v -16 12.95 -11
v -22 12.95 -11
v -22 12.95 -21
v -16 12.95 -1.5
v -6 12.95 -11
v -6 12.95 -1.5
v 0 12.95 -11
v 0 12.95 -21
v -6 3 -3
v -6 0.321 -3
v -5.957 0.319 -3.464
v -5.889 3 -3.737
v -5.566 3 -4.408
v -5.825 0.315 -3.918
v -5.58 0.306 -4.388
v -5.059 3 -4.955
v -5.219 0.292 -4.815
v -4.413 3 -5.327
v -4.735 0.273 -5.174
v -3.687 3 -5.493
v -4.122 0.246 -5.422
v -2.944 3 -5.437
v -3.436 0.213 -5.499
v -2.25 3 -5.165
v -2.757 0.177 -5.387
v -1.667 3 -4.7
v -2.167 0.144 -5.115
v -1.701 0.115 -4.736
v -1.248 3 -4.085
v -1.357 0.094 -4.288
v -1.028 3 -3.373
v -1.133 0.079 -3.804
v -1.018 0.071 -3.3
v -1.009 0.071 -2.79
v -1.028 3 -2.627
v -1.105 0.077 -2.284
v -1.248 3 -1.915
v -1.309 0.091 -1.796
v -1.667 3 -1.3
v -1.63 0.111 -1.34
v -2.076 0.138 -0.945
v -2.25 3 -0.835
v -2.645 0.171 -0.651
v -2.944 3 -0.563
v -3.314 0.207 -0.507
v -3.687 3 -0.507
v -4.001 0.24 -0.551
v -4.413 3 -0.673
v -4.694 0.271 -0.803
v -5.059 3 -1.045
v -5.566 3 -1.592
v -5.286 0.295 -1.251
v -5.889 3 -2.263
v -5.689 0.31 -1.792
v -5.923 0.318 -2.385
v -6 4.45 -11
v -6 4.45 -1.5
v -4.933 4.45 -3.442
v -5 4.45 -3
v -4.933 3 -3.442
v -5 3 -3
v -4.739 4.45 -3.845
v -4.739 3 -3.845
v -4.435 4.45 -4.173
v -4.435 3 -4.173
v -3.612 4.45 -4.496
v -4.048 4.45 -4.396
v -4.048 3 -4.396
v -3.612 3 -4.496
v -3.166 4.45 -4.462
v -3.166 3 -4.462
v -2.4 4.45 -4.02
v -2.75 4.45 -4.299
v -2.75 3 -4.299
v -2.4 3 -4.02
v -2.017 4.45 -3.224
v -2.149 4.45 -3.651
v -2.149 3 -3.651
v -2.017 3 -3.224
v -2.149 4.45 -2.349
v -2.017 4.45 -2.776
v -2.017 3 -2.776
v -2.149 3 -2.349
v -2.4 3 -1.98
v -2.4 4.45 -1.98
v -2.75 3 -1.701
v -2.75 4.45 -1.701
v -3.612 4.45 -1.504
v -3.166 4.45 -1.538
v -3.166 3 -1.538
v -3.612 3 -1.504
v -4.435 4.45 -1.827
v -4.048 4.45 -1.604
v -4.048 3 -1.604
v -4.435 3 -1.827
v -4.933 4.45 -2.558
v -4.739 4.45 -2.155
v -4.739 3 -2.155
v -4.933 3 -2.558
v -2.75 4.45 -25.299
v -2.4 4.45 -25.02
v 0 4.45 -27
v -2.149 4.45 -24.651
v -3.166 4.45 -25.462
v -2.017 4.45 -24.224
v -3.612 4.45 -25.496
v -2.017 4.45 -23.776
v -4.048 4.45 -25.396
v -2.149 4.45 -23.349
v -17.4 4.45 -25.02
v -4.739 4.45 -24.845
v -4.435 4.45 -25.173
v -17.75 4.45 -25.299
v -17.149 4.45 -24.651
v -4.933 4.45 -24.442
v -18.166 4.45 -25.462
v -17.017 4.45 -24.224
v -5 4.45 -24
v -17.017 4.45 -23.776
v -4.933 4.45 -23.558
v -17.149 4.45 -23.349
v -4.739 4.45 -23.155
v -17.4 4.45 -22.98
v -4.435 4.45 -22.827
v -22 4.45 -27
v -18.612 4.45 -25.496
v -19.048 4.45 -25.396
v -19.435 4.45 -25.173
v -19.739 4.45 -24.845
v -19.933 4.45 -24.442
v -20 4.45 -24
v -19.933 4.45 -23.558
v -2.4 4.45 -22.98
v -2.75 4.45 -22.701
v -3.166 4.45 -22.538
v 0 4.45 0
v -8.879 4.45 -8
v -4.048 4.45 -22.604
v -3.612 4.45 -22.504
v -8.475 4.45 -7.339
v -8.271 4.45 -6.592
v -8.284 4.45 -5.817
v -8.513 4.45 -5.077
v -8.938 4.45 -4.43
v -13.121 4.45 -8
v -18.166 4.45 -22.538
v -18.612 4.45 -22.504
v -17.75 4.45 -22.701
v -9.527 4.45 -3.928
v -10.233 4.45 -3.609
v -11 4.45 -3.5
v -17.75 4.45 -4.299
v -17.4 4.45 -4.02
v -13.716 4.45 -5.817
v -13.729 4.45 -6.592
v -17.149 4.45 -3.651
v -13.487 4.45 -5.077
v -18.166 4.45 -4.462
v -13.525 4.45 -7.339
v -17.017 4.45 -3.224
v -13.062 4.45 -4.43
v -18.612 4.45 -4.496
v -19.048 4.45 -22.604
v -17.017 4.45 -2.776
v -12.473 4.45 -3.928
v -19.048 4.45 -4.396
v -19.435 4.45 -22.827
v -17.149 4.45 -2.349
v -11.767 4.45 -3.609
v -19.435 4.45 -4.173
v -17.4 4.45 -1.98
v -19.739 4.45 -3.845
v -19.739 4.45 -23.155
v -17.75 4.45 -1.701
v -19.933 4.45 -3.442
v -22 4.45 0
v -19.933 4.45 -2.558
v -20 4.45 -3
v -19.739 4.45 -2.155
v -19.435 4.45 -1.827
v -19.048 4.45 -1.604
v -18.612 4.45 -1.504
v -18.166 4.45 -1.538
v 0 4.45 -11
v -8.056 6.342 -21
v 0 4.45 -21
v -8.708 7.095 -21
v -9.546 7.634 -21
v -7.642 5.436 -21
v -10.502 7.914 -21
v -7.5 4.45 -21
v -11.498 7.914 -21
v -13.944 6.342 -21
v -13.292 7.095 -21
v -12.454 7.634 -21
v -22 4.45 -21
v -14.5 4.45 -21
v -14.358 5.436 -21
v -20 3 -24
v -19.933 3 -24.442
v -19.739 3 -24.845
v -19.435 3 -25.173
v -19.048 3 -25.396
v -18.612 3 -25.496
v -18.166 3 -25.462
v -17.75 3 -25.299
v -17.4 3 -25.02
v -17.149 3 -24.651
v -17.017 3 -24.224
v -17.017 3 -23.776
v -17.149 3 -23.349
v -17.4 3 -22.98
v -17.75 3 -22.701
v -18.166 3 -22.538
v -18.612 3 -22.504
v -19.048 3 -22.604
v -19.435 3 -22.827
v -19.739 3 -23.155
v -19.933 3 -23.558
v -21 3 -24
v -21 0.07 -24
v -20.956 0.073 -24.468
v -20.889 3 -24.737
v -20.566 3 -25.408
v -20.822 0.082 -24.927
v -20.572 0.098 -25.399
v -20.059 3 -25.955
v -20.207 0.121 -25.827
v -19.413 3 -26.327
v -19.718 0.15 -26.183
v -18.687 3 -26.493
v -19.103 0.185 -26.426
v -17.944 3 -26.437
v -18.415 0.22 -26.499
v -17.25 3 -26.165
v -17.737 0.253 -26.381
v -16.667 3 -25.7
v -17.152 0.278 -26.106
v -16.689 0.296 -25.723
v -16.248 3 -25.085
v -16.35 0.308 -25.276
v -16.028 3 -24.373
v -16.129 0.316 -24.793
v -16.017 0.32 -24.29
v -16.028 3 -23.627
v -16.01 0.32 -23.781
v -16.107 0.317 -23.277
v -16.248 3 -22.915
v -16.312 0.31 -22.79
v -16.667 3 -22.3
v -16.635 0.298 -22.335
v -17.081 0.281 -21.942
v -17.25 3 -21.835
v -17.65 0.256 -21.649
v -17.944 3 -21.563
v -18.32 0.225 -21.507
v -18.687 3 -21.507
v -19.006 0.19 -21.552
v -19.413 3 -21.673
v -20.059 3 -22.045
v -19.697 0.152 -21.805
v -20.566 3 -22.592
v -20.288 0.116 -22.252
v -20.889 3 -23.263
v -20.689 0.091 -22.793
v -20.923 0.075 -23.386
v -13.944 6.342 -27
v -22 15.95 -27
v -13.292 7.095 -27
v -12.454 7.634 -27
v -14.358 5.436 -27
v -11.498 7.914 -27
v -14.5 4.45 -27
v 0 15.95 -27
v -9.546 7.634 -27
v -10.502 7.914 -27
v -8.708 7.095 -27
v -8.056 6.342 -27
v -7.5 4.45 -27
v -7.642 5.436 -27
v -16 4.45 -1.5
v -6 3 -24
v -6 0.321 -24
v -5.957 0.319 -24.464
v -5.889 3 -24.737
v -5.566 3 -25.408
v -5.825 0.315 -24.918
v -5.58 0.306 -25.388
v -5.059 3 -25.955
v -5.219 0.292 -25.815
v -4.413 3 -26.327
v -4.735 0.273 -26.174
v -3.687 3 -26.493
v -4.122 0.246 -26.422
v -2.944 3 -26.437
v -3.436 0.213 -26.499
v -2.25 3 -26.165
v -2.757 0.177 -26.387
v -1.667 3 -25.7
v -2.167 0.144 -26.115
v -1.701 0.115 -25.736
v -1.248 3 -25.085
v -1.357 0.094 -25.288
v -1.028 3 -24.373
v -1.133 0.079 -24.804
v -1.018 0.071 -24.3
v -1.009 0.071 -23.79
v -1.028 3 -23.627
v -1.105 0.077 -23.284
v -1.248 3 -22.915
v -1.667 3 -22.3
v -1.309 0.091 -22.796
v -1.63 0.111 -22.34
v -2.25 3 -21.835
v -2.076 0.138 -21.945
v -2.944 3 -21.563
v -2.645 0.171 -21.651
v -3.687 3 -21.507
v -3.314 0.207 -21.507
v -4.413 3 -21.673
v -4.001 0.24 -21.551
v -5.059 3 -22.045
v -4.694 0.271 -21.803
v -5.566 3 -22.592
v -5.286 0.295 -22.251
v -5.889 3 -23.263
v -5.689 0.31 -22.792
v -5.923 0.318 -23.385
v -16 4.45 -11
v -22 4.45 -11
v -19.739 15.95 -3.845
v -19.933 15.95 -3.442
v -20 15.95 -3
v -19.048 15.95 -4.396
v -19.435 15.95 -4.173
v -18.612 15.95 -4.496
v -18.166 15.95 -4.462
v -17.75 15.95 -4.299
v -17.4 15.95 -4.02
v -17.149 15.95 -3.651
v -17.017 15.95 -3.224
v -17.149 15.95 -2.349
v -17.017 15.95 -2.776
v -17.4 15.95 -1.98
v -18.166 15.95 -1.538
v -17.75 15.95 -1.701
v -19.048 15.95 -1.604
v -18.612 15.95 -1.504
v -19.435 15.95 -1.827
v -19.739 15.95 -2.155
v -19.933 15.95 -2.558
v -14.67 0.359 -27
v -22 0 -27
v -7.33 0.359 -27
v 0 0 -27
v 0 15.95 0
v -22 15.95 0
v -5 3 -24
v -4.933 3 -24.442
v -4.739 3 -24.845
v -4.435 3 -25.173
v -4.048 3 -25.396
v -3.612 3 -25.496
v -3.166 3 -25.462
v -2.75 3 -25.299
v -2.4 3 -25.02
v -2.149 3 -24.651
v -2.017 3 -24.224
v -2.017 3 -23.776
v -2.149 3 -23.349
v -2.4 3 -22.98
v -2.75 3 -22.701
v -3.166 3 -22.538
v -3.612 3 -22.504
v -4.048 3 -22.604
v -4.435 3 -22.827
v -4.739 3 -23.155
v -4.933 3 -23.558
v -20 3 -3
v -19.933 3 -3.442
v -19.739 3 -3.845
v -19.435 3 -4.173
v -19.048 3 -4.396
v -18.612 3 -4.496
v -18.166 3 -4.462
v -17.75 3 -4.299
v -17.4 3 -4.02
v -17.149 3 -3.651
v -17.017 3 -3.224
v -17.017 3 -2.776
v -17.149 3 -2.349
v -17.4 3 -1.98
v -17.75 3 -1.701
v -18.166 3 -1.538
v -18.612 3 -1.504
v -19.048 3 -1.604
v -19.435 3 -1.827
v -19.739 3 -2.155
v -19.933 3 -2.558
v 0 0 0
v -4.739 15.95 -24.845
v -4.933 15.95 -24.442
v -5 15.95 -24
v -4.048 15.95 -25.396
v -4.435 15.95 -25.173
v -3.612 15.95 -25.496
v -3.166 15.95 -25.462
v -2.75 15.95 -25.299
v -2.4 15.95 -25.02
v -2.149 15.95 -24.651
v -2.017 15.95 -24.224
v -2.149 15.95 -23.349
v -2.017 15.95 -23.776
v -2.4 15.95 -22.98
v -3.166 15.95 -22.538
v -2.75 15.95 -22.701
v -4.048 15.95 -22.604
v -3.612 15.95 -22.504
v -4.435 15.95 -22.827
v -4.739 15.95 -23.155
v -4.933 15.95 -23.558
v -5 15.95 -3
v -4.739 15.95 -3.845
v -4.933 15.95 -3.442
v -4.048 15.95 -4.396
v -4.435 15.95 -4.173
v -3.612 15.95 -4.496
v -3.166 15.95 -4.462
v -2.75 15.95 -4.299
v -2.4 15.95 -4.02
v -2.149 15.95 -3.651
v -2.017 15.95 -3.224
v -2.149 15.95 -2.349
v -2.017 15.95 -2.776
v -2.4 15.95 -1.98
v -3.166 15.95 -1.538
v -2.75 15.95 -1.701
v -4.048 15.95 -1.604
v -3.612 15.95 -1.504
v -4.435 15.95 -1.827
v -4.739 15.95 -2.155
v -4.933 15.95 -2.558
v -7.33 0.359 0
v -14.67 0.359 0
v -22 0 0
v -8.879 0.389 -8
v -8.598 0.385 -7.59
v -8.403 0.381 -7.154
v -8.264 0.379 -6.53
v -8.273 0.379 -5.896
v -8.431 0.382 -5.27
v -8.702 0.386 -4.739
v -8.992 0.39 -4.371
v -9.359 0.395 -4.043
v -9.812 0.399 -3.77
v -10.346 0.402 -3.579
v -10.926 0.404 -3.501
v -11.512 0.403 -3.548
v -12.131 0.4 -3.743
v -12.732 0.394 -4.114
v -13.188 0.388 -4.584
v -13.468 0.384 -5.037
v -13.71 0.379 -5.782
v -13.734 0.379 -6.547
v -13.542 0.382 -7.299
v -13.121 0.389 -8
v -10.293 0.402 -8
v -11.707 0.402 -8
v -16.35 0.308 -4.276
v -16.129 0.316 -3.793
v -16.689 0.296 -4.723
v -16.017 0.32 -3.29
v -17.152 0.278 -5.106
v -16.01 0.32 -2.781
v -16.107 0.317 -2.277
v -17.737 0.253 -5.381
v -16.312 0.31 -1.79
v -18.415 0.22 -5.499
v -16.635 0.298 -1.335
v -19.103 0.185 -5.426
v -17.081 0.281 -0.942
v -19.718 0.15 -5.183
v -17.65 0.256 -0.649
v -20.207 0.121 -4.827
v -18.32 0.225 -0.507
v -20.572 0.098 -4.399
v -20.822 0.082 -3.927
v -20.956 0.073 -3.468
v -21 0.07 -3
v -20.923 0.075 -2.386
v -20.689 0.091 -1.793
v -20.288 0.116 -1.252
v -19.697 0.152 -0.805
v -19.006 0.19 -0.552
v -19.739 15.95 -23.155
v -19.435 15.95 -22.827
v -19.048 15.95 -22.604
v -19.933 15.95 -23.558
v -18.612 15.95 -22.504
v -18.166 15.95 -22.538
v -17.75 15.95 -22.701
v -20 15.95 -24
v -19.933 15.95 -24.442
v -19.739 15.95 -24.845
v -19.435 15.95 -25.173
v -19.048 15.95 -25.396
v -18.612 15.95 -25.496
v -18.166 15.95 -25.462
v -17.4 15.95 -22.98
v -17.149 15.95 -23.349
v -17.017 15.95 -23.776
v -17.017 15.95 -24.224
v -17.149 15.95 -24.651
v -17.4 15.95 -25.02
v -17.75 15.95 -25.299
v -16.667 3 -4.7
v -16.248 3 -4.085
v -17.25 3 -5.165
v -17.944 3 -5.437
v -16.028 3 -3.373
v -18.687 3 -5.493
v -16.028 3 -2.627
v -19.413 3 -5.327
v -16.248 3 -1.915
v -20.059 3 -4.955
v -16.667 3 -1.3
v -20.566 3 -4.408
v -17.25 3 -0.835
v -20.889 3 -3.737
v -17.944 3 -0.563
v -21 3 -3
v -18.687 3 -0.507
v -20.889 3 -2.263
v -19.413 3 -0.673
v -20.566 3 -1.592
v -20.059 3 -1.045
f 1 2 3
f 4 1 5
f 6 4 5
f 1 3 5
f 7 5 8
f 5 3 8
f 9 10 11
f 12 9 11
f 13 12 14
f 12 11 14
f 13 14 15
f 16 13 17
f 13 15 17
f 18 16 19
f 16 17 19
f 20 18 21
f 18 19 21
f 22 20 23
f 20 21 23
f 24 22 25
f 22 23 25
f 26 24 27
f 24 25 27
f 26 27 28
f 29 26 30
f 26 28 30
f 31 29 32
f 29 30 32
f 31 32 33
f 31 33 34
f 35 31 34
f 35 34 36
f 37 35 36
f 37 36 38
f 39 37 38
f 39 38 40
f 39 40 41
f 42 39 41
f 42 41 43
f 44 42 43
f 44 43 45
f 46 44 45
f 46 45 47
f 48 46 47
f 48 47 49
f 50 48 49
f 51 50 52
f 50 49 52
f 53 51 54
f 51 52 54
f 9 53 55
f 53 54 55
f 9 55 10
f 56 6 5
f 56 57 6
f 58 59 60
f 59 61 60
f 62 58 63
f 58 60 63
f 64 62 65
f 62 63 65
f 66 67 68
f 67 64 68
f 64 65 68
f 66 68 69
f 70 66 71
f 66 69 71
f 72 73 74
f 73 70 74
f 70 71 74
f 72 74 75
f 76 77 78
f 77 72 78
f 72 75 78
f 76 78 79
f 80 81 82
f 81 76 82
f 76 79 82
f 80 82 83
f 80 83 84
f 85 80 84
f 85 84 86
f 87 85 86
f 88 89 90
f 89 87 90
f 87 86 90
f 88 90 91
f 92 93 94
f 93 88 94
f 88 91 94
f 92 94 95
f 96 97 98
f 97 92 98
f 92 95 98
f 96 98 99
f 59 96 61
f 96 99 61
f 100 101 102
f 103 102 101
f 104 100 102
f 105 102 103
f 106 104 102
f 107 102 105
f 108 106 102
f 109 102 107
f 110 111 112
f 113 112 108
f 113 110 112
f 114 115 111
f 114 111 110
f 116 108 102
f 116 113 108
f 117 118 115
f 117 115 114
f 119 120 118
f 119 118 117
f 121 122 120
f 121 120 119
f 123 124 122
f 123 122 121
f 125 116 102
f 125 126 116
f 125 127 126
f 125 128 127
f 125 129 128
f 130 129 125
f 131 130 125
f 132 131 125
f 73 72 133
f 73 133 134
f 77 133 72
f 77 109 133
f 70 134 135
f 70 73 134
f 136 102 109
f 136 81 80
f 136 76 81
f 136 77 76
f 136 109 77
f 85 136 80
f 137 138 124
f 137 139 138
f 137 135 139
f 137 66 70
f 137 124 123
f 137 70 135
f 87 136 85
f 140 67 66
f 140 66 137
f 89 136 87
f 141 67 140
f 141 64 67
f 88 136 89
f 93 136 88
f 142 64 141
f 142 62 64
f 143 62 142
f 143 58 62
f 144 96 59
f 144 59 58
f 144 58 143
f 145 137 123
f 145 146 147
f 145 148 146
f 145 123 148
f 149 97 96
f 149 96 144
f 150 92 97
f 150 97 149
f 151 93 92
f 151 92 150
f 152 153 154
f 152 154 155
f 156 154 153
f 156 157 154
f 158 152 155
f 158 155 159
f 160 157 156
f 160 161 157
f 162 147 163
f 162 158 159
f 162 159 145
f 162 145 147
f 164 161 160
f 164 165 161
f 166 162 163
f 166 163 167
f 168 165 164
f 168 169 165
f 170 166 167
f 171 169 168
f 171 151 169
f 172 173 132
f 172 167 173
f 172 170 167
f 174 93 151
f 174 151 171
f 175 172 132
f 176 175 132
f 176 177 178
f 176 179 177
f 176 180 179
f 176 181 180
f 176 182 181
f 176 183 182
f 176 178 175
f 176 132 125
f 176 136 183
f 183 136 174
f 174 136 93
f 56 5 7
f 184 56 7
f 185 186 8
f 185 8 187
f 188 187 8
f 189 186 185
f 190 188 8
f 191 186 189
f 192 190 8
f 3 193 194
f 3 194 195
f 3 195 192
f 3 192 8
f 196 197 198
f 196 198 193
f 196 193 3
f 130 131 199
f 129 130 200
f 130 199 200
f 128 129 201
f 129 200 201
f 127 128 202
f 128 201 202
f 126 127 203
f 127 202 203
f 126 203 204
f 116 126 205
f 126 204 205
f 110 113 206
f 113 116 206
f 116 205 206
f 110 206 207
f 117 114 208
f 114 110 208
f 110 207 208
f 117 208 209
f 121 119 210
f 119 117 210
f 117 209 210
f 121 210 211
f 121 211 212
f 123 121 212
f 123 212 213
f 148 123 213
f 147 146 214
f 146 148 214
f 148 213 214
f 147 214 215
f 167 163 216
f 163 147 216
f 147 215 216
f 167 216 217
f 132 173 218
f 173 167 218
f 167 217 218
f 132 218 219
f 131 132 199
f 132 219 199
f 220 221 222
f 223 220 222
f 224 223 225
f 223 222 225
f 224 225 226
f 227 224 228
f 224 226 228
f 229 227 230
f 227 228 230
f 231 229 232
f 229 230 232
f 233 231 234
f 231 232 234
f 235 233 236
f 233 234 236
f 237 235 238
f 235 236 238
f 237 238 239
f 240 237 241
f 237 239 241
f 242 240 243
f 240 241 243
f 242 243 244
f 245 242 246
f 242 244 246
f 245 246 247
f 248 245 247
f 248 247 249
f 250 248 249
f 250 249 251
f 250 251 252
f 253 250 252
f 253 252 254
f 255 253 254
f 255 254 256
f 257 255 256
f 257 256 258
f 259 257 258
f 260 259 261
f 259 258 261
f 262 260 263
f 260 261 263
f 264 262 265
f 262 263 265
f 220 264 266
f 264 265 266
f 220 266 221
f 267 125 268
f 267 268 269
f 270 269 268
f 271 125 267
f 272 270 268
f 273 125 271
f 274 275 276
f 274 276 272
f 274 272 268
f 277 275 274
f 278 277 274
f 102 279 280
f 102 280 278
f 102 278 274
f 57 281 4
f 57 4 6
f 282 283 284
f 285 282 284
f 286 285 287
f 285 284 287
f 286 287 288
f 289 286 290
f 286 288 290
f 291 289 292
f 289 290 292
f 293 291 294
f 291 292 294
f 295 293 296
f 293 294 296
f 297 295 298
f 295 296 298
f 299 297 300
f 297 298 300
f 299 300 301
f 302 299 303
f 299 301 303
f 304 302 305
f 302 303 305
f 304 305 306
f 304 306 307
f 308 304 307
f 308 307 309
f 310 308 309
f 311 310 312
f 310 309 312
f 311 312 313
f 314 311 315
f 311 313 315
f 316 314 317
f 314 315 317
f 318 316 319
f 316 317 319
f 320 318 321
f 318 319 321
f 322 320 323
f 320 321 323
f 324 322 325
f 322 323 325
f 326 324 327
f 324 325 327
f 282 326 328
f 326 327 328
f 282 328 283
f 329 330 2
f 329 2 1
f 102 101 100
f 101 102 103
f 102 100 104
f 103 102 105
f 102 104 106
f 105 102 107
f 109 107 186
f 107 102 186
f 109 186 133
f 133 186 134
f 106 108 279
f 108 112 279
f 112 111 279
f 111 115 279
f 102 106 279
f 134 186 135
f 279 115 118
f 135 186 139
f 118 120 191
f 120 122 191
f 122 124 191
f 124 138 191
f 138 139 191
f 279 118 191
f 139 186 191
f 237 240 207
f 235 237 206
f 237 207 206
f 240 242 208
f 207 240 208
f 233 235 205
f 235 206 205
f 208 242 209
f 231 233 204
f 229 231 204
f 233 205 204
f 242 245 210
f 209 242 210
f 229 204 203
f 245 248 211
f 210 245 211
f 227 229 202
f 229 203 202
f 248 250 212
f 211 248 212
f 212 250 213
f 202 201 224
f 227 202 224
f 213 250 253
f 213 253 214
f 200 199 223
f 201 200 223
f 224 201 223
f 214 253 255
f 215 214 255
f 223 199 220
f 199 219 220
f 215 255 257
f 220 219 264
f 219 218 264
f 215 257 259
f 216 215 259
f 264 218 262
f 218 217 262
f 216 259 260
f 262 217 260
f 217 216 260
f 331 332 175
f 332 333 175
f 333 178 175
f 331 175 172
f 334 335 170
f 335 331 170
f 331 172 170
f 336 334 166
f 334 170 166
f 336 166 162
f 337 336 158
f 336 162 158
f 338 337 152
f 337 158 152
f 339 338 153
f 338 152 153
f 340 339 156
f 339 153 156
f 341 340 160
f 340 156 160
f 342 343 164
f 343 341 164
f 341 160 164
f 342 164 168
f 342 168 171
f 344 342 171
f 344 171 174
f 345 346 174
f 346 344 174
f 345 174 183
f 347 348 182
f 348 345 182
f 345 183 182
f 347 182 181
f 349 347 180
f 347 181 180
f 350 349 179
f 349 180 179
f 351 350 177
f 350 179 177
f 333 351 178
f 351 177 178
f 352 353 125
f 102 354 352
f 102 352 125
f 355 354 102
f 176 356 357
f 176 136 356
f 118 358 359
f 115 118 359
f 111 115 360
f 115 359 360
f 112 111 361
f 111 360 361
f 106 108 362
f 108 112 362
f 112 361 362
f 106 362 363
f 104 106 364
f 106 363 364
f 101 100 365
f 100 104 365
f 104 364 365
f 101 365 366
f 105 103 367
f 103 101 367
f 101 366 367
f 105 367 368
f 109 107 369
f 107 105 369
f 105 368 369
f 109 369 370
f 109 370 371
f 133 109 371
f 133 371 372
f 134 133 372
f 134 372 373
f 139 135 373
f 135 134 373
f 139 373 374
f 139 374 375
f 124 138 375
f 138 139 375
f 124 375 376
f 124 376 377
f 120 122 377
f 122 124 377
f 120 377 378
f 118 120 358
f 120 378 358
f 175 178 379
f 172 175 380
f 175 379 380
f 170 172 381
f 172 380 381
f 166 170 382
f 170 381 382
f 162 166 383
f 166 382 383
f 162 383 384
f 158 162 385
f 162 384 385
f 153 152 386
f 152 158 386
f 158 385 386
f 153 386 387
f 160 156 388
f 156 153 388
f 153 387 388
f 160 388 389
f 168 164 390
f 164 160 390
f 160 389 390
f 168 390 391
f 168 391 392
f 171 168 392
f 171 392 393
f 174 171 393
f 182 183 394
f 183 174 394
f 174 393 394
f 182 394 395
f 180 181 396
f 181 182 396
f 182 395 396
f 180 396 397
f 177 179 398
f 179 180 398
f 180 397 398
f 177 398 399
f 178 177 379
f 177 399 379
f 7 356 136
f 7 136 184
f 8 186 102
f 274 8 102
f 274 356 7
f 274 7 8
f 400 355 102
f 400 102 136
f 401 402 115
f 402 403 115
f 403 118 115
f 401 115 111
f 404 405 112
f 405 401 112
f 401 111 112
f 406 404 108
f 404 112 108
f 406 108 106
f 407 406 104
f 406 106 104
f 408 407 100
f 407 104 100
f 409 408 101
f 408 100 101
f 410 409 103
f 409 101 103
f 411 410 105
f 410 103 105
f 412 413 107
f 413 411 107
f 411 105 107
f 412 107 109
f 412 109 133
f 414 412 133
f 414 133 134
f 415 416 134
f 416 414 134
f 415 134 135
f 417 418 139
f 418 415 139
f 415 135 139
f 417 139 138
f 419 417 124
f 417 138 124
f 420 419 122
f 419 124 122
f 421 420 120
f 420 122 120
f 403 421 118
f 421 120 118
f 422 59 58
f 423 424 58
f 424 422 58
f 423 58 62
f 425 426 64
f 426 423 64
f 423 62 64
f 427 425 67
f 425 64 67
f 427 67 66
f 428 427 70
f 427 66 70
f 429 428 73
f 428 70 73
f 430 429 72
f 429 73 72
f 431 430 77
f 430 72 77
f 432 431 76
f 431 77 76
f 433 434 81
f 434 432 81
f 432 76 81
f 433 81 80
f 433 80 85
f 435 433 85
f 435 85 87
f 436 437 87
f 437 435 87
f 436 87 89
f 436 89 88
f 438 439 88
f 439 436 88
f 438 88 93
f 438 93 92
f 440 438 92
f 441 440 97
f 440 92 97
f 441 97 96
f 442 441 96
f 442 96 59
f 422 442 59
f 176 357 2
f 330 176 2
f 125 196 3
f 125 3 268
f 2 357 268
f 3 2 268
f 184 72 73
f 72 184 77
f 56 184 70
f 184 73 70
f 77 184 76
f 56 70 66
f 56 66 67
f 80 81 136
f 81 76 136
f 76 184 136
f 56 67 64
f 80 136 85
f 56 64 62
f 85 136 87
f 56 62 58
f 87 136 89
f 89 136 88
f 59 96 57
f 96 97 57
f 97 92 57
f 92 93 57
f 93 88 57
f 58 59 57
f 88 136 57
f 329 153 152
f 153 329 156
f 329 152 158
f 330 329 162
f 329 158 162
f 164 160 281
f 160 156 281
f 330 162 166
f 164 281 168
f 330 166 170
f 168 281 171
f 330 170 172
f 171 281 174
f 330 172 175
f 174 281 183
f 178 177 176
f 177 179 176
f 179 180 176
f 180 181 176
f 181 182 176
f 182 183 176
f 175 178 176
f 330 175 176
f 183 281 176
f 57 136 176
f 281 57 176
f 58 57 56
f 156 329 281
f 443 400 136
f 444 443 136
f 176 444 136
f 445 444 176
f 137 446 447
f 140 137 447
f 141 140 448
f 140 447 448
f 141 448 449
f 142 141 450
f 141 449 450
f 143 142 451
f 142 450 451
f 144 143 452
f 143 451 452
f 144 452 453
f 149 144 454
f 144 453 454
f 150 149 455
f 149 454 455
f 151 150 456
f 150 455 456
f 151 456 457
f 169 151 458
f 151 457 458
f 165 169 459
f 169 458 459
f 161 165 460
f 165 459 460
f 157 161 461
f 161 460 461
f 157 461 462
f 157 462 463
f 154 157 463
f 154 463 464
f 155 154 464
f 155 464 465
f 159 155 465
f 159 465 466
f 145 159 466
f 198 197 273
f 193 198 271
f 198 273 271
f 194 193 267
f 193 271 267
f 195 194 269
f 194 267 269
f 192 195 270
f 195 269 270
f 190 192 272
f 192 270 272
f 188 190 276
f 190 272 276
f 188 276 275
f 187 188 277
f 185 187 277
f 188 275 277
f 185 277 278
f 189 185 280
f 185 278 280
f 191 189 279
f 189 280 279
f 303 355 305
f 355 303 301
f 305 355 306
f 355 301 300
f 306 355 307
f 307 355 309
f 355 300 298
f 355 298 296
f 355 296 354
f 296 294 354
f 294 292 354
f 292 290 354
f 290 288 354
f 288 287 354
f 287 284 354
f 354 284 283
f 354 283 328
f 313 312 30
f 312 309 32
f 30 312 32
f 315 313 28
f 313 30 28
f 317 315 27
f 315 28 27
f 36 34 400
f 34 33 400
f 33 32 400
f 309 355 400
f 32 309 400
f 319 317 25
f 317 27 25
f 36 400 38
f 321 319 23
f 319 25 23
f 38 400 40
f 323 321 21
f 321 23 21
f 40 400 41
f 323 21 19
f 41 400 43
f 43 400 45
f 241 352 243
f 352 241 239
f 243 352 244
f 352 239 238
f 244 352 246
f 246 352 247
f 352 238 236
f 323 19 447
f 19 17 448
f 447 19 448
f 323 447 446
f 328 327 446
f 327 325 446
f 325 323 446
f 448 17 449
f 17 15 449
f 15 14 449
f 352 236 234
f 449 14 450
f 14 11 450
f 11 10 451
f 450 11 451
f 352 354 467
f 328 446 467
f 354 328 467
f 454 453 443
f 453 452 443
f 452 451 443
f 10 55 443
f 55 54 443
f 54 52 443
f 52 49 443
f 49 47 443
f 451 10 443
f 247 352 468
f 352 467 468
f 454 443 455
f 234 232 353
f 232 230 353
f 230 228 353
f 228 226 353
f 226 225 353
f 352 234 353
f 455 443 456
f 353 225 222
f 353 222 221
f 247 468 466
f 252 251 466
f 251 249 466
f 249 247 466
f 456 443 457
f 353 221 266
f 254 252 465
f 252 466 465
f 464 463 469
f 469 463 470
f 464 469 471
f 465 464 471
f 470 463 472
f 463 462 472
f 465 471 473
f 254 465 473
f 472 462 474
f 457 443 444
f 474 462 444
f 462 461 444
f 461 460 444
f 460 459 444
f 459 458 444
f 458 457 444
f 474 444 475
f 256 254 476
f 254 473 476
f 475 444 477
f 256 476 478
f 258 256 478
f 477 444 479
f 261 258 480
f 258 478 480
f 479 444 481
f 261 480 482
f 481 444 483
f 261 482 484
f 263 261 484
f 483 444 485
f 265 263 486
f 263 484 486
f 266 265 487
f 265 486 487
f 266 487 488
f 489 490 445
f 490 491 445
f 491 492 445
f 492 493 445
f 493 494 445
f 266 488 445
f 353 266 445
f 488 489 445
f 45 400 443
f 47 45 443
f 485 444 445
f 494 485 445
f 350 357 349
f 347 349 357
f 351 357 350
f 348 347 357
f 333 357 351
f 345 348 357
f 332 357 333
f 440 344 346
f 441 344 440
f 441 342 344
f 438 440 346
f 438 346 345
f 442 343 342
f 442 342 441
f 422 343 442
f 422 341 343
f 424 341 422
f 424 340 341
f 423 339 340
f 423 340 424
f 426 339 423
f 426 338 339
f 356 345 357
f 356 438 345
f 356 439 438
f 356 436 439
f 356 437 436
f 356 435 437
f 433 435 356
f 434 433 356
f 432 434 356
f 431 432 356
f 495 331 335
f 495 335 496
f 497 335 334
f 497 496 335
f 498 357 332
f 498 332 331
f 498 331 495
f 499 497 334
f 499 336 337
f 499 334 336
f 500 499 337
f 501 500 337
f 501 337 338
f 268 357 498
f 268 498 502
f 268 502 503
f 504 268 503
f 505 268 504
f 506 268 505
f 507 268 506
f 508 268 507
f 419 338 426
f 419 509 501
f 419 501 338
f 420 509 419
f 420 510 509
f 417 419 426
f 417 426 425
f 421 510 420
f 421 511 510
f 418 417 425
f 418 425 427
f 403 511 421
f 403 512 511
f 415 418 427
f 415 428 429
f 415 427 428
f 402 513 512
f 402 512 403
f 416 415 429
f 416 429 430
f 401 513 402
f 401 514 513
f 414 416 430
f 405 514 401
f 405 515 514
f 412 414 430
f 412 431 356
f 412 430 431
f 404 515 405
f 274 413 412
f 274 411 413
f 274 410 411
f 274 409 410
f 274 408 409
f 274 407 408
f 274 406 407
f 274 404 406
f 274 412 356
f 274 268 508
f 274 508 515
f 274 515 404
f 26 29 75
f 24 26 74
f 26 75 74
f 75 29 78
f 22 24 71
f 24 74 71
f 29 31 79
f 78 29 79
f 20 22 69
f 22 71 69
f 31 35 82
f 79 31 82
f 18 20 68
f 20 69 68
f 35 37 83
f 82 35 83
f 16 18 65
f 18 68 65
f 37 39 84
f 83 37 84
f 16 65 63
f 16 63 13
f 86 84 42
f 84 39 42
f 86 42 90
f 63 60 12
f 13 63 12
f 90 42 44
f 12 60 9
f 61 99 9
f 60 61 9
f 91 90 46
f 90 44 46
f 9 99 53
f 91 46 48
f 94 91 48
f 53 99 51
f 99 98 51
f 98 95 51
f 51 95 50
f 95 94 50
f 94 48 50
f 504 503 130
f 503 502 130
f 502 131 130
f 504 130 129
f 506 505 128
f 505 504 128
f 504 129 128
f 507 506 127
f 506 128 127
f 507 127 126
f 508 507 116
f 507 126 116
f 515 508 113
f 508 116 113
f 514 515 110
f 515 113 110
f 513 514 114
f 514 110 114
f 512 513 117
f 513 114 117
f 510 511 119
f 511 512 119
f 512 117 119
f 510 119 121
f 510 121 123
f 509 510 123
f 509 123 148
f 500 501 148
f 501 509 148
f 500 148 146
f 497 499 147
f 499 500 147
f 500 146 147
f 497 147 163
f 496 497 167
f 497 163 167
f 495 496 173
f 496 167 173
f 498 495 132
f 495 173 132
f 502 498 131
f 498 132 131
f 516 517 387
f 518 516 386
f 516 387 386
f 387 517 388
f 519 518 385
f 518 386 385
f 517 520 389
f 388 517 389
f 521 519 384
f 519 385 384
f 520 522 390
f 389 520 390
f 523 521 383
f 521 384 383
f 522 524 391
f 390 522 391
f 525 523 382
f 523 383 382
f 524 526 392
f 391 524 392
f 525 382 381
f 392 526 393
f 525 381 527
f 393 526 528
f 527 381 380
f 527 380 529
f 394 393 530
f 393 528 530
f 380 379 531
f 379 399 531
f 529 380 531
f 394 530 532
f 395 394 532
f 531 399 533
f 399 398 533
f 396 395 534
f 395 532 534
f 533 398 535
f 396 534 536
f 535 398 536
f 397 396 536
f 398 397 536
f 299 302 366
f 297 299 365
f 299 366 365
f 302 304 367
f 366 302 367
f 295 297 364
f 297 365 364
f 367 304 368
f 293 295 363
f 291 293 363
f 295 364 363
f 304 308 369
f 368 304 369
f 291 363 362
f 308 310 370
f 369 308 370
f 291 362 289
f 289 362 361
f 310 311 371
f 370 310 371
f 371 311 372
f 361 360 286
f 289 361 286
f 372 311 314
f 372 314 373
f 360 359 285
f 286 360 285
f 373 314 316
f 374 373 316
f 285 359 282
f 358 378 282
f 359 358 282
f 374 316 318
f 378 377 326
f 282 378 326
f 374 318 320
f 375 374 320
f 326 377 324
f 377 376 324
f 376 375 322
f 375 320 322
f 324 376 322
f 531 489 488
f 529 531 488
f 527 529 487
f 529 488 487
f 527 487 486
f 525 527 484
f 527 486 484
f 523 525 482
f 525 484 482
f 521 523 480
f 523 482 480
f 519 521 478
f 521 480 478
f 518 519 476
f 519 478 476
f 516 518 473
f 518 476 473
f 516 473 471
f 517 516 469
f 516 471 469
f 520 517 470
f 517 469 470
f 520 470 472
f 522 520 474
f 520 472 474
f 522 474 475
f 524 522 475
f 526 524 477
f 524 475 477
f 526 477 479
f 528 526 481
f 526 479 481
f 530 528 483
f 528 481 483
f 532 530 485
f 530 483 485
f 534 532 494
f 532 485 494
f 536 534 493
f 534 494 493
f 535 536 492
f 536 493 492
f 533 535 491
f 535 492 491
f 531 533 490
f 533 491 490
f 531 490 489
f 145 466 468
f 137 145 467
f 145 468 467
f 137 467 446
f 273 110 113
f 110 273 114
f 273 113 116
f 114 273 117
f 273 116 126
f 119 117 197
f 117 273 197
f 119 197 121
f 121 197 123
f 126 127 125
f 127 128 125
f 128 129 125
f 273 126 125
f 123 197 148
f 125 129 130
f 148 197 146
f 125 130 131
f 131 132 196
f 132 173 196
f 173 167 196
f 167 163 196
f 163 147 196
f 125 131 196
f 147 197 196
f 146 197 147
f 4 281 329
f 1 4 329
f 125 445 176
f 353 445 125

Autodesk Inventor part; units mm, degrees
ref_plane "YZ Plane" through (0, 0, 0) normal (1, 0, 0) x (0, 1, 0)
ref_plane "XZ Plane" through (0, 0, 0) normal (0, 1, 0) x (-1, 0, 0)
ref_plane "XY Plane" through (0, 0, 0) normal (0, 0, 1) x (1, 0, 0)
sketch "Sketch1" plane through (0, 0, 0) normal (0, 1, 0) x (-1, 0, 0)
  line L0 (0, 0) -> (22, 0)
  line L1 (22, 0) -> (22, -27)
  line L2 (22, -27) -> (0, -27)
  line L3 (0, -27) -> (0, 0)
  arc A0 (13.1213, -8) -> (8.8787, -8) centre (11, -6.25) ccw
  line L4 (13.1213, -8) -> (8.8787, -8)
  line L5 (11, 0) -> (11, -27) construction
  line L6 (0, -21) -> (22, -21)
  line L7 (22, -11) -> (0, -11)
  circle A1 centre (3.5, -24) radius 1.5
  circle A2 centre (18.5, -24) radius 1.5
  circle A3 centre (3.5, -3) radius 1.5
  circle A4 centre (18.5, -3) radius 1.5
  line L8 (3.5, -3) -> (3.5, -24) construction
  line L9 (3.5, -24) -> (18.5, -24) construction
  line L10 (18.5, -24) -> (18.5, -3) construction
  line L11 (18.5, -3) -> (3.5, -3) construction
  line L12 (0, 0) -> (22, -27) construction
  line L13 (18.5, -3) -> (3.5, -24) construction
  line L14 (15.2792, -21) -> (15.2792, -27) construction
  line L15 (16, -1.5) -> (16, -11)
  line L16 (6, -1.5) -> (6, -11)
  line L17 (16, -1.5) -> (6, -11) construction
  line L18 (16, -1.5) -> (6, -1.5)
  point P0 (11, -13.5)
  point P1 (15.2792, -24)
  point P2 (11, -6.25)
  dimension "d1" = 5.5
  dimension "d2" = 4.5
  dimension "d5" = 6.25
  dimension "d6" = 22
  dimension "d8" = 10
  dimension "d9" = 3
  dimension "d10" = 6
  dimension "d11" = 3
  dimension "d12" = 3.5
  dimension "d16" = 10
  dimension "d17" = 1.5
extrude "Extrusion1" add sketch "Sketch1" along normal blind 4.45
sketch "Sketch2" plane through (0, 0, 0) normal (0, 0, 1) x (1, 0, 0)
  arc A0 (0, 0) -> (-22, 0) centre (-11, -149.5961) ccw
  line L0 (0, 0) -> (-22, 0)
  dimension "d20" = 150
extrude "Extrusion4" cut sketch "Sketch2" against normal through all
ref_plane "Work Plane1" through (0, 15.95, 0) normal (0, 1, 0) x (1, 0, 0)
extrude "Extrusion5" add sketch "Sketch1" along normal up to surface (11.5 mm away) from surface at 4.45 separate body contours L0 L1 L7 L15 L18 L16 L3 | L6 L1 L2 L3
sketch "Sketch3" plane through (0, 15.95, 0) normal (0, 1, 0) x (1, 0, 0)
  line L0 (0, 21) -> (-22, 21) projected
  line L1 (-22, 21) -> (-22, 27) projected
  line L2 (-22, 27) -> (0, 27) projected
  line L3 (0, 27) -> (0, 21) projected
  circle A0 centre (-18.5, 24) radius 1.5 projected
  circle A1 centre (-3.5, 24) radius 1.5 projected
  line L4 (-16, 11) -> (-16, 1.5) projected
  line L5 (-16, 1.5) -> (-6, 1.5) projected
  line L6 (-6, 1.5) -> (-6, 11) projected
  line L7 (-6, 11) -> (0, 11) projected
  line L8 (0, 11) -> (0, 0) projected
  line L9 (0, 0) -> (-22, 0) projected
  line L10 (-22, 0) -> (-22, 11) projected
  line L11 (-22, 11) -> (-16, 11) projected
  circle A2 centre (-3.5, 3) radius 1.5 projected
  circle A3 centre (-18.5, 3) radius 1.5 projected
  line L12 (-6, 11) -> (0, 11) projected
  line L13 (0, 11) -> (0, 21)
  line L14 (0, 0) -> (0, 27) projected
  line L15 (-22, 11) -> (-22, 21)
extrude "Extrusion6" add sketch "Sketch3" against normal blind 3 contours L13 L7 L6 L5 L4 L11 L15 L0 bodies 2
sketch "Sketch4" plane through (0, 15.95, -27) normal (0, 0, -1) x (-1, 0, 0)
  line L0 (0, -11.5) -> (22, -11.5) projected
  circle A0 centre (11, -11.5) radius 3.5
  point P0 (0, -15.95)
  dimension "d28" = 7
extrude "Extrusion7" cut sketch "Sketch4" against normal up to surface (6 mm away) bodies 2
sketch "Sketch5" plane through (0, 0, 0) normal (0, 1, 0) x (-1, 0, 0)
  circle A0 centre (3.5, -24) radius 1.5 projected
  circle A1 centre (3.5, -24) radius 2.5
  circle A2 centre (18.5, -24) radius 2.5
  circle A3 centre (18.5, -3) radius 2.5
  circle A4 centre (3.5, -3) radius 1.5 projected
  circle A5 centre (3.5, -3) radius 2.5
  point P0 (0, 0)
  dimension "d31" = 5
extrude "Extrusion8" cut sketch "Sketch5" along normal blind 3 bodies 2 1
equation "\"d1\" = dallas_diameter + 2 * Margin"
equation "\"d2\" = dallas_short_diameter + 2 * Margin"
equation "\"Margin\" = 0.5"
equation "\"dallas_diameter\" = 4.5"
equation "\"dallas_short_diameter\" = 3.5"
equation "\"height_part\" = 15.5"
properties part number "dallas_holder"
